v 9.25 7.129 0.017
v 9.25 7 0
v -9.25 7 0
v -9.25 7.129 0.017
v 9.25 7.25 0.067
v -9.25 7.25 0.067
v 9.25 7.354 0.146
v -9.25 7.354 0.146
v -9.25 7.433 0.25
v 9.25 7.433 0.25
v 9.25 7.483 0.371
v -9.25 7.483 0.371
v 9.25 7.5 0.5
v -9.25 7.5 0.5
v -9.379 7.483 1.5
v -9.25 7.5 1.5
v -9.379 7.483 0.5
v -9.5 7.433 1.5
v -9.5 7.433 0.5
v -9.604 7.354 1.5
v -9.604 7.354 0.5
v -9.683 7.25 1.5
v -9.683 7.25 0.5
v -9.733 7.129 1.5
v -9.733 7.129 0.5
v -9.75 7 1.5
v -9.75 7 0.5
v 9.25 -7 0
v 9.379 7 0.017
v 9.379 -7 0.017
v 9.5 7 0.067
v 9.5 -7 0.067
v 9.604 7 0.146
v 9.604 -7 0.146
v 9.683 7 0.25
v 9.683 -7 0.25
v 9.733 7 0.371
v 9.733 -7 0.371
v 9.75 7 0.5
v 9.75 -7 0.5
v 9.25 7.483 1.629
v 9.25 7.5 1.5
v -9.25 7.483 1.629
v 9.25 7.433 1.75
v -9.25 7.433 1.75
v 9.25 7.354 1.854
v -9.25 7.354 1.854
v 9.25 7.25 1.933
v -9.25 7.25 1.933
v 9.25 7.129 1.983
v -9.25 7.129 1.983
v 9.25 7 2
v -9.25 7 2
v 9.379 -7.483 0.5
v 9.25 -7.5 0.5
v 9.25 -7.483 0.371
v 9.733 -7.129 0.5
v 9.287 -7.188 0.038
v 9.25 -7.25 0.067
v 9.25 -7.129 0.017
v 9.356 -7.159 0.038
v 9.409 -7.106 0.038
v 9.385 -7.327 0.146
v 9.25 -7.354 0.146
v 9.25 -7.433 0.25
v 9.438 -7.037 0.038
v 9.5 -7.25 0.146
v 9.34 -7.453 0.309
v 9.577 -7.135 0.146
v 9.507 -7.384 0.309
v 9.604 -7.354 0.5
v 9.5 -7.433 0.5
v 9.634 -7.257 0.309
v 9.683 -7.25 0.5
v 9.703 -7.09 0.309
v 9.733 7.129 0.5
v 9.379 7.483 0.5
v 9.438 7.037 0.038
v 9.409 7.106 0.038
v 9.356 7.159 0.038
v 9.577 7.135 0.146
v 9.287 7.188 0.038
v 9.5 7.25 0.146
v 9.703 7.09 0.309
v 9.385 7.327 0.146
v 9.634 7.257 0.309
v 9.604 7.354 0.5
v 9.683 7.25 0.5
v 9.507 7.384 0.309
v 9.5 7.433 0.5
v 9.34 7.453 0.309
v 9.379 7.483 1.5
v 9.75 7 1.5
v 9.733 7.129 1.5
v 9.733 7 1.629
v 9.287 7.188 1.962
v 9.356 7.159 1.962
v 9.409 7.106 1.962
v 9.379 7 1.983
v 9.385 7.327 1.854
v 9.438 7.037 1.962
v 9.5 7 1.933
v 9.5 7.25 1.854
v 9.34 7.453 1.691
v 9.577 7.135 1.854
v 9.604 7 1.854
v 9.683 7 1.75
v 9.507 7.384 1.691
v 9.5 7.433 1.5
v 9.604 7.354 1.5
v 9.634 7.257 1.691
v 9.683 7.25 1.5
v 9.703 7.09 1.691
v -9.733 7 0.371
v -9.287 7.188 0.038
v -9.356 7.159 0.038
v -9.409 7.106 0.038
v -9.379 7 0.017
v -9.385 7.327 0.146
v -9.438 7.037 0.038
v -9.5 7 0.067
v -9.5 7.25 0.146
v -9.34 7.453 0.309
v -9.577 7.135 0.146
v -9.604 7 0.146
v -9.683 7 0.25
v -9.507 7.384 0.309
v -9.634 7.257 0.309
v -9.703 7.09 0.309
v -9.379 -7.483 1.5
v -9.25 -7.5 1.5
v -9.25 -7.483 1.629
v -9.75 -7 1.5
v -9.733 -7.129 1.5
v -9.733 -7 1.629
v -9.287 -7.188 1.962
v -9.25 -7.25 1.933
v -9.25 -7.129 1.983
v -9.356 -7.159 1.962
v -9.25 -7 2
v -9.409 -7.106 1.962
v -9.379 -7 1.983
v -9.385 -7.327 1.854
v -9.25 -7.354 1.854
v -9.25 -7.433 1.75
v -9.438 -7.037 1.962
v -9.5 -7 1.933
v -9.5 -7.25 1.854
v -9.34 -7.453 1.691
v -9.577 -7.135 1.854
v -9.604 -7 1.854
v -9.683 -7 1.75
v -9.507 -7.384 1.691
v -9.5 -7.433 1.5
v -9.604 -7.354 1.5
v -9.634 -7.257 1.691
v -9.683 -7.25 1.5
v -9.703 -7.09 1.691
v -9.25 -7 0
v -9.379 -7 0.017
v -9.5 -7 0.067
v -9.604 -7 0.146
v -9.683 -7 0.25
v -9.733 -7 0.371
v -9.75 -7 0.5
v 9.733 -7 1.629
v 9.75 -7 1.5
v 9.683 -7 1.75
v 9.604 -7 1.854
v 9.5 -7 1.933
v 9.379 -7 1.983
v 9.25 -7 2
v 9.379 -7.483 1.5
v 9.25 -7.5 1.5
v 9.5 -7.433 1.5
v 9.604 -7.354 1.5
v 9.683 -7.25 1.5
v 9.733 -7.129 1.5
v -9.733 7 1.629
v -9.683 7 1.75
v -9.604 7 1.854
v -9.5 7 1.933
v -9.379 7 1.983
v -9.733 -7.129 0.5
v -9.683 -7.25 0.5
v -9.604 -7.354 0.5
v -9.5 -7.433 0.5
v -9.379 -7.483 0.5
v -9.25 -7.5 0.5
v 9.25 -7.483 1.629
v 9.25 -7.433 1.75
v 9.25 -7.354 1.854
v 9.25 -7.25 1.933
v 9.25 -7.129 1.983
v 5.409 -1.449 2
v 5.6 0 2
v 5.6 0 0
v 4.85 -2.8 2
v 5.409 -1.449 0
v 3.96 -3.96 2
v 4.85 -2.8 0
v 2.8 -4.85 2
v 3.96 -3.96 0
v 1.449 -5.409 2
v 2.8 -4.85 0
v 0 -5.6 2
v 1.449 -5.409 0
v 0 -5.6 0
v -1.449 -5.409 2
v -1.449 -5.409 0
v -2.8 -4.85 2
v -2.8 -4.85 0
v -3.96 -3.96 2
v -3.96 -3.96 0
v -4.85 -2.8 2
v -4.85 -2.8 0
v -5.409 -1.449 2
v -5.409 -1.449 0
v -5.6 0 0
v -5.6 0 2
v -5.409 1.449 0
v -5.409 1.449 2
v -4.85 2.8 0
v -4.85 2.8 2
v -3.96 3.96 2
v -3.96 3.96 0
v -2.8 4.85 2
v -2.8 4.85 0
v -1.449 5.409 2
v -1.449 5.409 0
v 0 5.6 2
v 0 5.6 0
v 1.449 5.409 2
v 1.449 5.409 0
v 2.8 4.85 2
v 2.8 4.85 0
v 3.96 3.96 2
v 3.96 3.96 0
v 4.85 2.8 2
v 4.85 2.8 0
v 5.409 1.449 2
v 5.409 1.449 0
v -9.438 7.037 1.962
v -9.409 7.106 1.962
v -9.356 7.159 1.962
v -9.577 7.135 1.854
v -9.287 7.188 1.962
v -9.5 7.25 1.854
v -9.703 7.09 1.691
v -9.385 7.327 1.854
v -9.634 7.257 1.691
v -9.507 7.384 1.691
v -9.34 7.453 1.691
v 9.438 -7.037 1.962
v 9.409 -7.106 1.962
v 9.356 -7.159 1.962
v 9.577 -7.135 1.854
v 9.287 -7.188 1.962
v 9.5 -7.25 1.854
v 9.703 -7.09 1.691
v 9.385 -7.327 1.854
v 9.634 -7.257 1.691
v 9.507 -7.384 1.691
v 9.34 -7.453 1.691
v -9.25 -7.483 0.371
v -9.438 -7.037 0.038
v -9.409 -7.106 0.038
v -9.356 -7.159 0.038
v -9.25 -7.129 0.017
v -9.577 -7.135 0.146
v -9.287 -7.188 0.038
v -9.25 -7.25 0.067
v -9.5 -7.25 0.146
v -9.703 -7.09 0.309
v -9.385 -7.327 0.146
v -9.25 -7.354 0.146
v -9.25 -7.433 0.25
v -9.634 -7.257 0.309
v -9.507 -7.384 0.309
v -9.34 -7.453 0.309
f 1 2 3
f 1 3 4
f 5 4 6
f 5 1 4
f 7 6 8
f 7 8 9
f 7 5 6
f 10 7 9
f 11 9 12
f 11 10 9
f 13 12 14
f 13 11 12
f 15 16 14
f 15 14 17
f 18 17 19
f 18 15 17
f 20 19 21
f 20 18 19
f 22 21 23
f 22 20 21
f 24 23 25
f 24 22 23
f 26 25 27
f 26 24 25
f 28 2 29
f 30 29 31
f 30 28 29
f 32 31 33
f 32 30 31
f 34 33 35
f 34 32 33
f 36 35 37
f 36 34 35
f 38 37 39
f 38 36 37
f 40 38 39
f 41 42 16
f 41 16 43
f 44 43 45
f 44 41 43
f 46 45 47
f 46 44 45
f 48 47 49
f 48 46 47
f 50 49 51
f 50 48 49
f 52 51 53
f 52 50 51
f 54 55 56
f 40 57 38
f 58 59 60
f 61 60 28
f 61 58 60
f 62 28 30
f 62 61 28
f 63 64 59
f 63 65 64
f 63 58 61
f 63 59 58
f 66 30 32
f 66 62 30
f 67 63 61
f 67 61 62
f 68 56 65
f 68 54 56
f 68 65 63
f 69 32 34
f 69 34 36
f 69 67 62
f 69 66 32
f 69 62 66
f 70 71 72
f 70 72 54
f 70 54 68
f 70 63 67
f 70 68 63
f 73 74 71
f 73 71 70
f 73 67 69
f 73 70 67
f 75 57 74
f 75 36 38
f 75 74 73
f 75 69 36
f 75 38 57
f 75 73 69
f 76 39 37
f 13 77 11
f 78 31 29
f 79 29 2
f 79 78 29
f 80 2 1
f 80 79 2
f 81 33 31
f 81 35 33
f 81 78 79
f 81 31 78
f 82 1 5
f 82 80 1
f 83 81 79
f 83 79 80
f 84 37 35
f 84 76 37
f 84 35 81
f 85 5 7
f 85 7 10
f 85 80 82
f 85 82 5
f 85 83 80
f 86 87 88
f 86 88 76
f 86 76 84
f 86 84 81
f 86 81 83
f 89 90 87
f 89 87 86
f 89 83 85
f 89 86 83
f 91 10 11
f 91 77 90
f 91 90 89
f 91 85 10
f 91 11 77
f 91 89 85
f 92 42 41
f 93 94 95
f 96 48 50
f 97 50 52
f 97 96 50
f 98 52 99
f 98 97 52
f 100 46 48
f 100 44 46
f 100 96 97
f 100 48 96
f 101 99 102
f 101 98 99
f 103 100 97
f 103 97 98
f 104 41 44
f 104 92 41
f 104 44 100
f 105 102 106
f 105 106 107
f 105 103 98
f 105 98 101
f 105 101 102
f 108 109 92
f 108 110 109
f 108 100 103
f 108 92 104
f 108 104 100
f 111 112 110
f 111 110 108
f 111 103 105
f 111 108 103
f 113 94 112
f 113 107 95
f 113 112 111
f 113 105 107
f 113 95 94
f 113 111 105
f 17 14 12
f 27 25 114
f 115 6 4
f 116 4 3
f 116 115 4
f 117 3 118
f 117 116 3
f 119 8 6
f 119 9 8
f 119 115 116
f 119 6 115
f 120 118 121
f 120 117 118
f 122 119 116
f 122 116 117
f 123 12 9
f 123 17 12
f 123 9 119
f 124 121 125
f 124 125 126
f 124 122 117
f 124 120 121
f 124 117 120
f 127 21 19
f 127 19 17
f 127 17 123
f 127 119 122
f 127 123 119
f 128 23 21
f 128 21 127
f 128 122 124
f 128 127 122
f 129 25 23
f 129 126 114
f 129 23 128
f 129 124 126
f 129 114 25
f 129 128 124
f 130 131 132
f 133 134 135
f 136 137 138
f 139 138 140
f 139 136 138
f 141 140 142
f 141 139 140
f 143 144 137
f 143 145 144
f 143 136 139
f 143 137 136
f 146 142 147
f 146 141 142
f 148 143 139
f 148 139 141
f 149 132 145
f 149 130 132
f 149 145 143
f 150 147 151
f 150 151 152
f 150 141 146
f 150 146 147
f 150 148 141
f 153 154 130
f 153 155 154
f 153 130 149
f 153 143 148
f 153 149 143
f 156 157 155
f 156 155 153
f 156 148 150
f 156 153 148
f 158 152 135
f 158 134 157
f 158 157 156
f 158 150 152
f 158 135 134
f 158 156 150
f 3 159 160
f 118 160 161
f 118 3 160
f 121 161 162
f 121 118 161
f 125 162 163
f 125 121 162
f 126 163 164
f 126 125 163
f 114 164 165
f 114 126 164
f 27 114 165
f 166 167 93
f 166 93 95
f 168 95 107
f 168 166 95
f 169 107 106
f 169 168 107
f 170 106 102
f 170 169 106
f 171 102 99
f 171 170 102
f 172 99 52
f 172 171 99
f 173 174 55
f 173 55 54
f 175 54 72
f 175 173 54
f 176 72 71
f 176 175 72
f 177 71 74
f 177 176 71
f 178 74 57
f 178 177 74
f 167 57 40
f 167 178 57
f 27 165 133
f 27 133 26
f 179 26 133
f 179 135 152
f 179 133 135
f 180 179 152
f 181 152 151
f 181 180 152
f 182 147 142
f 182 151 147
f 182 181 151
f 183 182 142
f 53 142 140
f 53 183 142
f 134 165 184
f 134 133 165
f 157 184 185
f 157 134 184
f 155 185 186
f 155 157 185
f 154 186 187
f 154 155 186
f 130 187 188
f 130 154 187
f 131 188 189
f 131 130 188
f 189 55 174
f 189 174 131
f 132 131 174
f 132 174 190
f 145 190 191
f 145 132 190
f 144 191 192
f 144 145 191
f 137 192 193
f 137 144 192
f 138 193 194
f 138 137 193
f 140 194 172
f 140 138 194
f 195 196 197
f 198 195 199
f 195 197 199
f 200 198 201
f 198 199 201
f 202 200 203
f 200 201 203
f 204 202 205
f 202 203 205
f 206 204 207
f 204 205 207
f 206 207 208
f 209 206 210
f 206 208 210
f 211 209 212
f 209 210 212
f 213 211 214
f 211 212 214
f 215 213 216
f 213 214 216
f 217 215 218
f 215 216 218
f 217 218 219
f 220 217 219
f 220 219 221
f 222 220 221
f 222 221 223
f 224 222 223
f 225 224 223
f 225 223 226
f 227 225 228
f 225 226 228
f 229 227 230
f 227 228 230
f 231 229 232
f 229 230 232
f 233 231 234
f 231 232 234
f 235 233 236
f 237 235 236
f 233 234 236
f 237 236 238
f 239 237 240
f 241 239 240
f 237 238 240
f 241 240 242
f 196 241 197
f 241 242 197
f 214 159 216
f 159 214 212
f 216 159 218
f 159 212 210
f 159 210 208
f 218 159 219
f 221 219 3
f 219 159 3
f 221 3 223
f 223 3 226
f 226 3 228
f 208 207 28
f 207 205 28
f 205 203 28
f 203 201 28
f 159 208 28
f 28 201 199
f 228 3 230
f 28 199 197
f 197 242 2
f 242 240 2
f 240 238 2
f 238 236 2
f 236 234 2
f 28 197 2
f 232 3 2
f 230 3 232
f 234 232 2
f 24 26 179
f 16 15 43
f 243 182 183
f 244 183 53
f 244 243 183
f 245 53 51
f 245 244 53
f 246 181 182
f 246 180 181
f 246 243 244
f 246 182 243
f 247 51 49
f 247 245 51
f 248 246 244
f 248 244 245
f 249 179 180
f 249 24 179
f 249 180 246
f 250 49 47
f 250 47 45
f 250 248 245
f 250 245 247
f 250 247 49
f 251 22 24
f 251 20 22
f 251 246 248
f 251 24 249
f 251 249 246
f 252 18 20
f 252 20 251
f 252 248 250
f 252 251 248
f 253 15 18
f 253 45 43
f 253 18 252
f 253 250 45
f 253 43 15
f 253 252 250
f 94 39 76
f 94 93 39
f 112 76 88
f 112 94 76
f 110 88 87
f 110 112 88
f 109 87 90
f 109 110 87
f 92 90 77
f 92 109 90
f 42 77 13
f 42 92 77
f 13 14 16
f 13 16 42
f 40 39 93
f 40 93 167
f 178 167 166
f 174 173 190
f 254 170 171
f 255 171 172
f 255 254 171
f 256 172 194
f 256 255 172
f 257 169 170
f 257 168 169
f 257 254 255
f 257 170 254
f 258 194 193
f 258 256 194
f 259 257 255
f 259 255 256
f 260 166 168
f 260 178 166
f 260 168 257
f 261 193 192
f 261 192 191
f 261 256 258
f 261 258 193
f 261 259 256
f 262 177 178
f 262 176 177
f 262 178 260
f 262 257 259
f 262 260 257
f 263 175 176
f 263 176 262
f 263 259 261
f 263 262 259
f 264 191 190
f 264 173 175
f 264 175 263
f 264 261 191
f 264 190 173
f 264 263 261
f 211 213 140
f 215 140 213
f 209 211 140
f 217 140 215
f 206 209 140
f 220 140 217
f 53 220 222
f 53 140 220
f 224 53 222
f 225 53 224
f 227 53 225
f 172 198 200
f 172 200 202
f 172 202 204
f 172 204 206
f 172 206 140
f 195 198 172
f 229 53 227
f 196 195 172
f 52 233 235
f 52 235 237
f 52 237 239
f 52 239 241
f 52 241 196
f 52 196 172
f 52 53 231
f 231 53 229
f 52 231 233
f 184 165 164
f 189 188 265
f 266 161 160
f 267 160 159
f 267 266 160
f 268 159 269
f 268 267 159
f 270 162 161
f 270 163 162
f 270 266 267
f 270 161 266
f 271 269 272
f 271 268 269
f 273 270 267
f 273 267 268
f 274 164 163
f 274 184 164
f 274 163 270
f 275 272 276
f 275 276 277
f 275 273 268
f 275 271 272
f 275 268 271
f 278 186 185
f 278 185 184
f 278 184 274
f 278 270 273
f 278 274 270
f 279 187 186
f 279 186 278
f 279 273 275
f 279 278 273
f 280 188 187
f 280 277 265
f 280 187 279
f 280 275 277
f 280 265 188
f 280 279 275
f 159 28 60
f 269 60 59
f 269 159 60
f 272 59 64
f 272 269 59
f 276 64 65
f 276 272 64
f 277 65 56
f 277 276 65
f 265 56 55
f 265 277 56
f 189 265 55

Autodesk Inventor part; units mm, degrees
ref_plane "YZ Plane" through (0, 0, 0) normal (1, 0, 0) x (0, 1, 0)
ref_plane "XZ Plane" through (0, 0, 0) normal (0, 1, 0) x (-1, 0, 0)
ref_plane "XY Plane" through (0, 0, 0) normal (0, 0, 1) x (1, 0, 0)
sketch "Sketch1" plane through (0, 0, 0) normal (0, 0, 1) x (1, 0, 0)
  line L0 (-9.75, -4.725) -> (-9.75, 4.725) projected
  line L1 (9.75, 4.725) -> (9.75, -4.725) projected
  circle A0 centre (0, 0) radius 5.6
  line L2 (0, 0) -> (0, 7.5)
  line L3 (0, 0) -> (0, -7.5)
  line L4 (-9.75, 7.5) -> (9.75, 7.5)
  line L5 (9.75, 7.5) -> (9.75, -7.5)
  line L6 (9.75, -7.5) -> (-9.75, -7.5)
  line L7 (-9.75, -7.5) -> (-9.75, 7.5)
  point P0 (0, 0)
  dimension "d0" = 11.2
  dimension "d5" = 7.5
  dimension "d6" = 7.5
extrude "Extrusion1" add sketch "Sketch1" along normal blind 2 contours L0 L7 L4 L2 A0 L3 L6 | L3 A0 L2 L4 L5 L1 L6
fillet "Fillet1" radius 0.5 4 edges at (9.75, 7.5, 1) (-9.75, 7.5, 1) (-9.75, -7.5, 1) (9.75, -7.5, 1)
fillet "Fillet2" radius 0.5 16 edges at (-9.6036, 7.3536, 2) (-9.75, 0, 2) (-9.6036, -7.3536, 2) (0, -7.5, 2) (9.6036, -7.3536, 2) (9.75, 0, 2) (9.6036, 7.3536, 2) (0, 7.5, 2) (9.6036, 7.3536, 0) (9.75, 0, 0) (9.6036, -7.3536, 0) (0, -7.5, 0) (-9.6036, -7.3536, 0) (-9.75, 0, 0) (-9.6036, 7.3536, 0) (0, 7.5, 0)
properties part number "SyringeAttachment"
